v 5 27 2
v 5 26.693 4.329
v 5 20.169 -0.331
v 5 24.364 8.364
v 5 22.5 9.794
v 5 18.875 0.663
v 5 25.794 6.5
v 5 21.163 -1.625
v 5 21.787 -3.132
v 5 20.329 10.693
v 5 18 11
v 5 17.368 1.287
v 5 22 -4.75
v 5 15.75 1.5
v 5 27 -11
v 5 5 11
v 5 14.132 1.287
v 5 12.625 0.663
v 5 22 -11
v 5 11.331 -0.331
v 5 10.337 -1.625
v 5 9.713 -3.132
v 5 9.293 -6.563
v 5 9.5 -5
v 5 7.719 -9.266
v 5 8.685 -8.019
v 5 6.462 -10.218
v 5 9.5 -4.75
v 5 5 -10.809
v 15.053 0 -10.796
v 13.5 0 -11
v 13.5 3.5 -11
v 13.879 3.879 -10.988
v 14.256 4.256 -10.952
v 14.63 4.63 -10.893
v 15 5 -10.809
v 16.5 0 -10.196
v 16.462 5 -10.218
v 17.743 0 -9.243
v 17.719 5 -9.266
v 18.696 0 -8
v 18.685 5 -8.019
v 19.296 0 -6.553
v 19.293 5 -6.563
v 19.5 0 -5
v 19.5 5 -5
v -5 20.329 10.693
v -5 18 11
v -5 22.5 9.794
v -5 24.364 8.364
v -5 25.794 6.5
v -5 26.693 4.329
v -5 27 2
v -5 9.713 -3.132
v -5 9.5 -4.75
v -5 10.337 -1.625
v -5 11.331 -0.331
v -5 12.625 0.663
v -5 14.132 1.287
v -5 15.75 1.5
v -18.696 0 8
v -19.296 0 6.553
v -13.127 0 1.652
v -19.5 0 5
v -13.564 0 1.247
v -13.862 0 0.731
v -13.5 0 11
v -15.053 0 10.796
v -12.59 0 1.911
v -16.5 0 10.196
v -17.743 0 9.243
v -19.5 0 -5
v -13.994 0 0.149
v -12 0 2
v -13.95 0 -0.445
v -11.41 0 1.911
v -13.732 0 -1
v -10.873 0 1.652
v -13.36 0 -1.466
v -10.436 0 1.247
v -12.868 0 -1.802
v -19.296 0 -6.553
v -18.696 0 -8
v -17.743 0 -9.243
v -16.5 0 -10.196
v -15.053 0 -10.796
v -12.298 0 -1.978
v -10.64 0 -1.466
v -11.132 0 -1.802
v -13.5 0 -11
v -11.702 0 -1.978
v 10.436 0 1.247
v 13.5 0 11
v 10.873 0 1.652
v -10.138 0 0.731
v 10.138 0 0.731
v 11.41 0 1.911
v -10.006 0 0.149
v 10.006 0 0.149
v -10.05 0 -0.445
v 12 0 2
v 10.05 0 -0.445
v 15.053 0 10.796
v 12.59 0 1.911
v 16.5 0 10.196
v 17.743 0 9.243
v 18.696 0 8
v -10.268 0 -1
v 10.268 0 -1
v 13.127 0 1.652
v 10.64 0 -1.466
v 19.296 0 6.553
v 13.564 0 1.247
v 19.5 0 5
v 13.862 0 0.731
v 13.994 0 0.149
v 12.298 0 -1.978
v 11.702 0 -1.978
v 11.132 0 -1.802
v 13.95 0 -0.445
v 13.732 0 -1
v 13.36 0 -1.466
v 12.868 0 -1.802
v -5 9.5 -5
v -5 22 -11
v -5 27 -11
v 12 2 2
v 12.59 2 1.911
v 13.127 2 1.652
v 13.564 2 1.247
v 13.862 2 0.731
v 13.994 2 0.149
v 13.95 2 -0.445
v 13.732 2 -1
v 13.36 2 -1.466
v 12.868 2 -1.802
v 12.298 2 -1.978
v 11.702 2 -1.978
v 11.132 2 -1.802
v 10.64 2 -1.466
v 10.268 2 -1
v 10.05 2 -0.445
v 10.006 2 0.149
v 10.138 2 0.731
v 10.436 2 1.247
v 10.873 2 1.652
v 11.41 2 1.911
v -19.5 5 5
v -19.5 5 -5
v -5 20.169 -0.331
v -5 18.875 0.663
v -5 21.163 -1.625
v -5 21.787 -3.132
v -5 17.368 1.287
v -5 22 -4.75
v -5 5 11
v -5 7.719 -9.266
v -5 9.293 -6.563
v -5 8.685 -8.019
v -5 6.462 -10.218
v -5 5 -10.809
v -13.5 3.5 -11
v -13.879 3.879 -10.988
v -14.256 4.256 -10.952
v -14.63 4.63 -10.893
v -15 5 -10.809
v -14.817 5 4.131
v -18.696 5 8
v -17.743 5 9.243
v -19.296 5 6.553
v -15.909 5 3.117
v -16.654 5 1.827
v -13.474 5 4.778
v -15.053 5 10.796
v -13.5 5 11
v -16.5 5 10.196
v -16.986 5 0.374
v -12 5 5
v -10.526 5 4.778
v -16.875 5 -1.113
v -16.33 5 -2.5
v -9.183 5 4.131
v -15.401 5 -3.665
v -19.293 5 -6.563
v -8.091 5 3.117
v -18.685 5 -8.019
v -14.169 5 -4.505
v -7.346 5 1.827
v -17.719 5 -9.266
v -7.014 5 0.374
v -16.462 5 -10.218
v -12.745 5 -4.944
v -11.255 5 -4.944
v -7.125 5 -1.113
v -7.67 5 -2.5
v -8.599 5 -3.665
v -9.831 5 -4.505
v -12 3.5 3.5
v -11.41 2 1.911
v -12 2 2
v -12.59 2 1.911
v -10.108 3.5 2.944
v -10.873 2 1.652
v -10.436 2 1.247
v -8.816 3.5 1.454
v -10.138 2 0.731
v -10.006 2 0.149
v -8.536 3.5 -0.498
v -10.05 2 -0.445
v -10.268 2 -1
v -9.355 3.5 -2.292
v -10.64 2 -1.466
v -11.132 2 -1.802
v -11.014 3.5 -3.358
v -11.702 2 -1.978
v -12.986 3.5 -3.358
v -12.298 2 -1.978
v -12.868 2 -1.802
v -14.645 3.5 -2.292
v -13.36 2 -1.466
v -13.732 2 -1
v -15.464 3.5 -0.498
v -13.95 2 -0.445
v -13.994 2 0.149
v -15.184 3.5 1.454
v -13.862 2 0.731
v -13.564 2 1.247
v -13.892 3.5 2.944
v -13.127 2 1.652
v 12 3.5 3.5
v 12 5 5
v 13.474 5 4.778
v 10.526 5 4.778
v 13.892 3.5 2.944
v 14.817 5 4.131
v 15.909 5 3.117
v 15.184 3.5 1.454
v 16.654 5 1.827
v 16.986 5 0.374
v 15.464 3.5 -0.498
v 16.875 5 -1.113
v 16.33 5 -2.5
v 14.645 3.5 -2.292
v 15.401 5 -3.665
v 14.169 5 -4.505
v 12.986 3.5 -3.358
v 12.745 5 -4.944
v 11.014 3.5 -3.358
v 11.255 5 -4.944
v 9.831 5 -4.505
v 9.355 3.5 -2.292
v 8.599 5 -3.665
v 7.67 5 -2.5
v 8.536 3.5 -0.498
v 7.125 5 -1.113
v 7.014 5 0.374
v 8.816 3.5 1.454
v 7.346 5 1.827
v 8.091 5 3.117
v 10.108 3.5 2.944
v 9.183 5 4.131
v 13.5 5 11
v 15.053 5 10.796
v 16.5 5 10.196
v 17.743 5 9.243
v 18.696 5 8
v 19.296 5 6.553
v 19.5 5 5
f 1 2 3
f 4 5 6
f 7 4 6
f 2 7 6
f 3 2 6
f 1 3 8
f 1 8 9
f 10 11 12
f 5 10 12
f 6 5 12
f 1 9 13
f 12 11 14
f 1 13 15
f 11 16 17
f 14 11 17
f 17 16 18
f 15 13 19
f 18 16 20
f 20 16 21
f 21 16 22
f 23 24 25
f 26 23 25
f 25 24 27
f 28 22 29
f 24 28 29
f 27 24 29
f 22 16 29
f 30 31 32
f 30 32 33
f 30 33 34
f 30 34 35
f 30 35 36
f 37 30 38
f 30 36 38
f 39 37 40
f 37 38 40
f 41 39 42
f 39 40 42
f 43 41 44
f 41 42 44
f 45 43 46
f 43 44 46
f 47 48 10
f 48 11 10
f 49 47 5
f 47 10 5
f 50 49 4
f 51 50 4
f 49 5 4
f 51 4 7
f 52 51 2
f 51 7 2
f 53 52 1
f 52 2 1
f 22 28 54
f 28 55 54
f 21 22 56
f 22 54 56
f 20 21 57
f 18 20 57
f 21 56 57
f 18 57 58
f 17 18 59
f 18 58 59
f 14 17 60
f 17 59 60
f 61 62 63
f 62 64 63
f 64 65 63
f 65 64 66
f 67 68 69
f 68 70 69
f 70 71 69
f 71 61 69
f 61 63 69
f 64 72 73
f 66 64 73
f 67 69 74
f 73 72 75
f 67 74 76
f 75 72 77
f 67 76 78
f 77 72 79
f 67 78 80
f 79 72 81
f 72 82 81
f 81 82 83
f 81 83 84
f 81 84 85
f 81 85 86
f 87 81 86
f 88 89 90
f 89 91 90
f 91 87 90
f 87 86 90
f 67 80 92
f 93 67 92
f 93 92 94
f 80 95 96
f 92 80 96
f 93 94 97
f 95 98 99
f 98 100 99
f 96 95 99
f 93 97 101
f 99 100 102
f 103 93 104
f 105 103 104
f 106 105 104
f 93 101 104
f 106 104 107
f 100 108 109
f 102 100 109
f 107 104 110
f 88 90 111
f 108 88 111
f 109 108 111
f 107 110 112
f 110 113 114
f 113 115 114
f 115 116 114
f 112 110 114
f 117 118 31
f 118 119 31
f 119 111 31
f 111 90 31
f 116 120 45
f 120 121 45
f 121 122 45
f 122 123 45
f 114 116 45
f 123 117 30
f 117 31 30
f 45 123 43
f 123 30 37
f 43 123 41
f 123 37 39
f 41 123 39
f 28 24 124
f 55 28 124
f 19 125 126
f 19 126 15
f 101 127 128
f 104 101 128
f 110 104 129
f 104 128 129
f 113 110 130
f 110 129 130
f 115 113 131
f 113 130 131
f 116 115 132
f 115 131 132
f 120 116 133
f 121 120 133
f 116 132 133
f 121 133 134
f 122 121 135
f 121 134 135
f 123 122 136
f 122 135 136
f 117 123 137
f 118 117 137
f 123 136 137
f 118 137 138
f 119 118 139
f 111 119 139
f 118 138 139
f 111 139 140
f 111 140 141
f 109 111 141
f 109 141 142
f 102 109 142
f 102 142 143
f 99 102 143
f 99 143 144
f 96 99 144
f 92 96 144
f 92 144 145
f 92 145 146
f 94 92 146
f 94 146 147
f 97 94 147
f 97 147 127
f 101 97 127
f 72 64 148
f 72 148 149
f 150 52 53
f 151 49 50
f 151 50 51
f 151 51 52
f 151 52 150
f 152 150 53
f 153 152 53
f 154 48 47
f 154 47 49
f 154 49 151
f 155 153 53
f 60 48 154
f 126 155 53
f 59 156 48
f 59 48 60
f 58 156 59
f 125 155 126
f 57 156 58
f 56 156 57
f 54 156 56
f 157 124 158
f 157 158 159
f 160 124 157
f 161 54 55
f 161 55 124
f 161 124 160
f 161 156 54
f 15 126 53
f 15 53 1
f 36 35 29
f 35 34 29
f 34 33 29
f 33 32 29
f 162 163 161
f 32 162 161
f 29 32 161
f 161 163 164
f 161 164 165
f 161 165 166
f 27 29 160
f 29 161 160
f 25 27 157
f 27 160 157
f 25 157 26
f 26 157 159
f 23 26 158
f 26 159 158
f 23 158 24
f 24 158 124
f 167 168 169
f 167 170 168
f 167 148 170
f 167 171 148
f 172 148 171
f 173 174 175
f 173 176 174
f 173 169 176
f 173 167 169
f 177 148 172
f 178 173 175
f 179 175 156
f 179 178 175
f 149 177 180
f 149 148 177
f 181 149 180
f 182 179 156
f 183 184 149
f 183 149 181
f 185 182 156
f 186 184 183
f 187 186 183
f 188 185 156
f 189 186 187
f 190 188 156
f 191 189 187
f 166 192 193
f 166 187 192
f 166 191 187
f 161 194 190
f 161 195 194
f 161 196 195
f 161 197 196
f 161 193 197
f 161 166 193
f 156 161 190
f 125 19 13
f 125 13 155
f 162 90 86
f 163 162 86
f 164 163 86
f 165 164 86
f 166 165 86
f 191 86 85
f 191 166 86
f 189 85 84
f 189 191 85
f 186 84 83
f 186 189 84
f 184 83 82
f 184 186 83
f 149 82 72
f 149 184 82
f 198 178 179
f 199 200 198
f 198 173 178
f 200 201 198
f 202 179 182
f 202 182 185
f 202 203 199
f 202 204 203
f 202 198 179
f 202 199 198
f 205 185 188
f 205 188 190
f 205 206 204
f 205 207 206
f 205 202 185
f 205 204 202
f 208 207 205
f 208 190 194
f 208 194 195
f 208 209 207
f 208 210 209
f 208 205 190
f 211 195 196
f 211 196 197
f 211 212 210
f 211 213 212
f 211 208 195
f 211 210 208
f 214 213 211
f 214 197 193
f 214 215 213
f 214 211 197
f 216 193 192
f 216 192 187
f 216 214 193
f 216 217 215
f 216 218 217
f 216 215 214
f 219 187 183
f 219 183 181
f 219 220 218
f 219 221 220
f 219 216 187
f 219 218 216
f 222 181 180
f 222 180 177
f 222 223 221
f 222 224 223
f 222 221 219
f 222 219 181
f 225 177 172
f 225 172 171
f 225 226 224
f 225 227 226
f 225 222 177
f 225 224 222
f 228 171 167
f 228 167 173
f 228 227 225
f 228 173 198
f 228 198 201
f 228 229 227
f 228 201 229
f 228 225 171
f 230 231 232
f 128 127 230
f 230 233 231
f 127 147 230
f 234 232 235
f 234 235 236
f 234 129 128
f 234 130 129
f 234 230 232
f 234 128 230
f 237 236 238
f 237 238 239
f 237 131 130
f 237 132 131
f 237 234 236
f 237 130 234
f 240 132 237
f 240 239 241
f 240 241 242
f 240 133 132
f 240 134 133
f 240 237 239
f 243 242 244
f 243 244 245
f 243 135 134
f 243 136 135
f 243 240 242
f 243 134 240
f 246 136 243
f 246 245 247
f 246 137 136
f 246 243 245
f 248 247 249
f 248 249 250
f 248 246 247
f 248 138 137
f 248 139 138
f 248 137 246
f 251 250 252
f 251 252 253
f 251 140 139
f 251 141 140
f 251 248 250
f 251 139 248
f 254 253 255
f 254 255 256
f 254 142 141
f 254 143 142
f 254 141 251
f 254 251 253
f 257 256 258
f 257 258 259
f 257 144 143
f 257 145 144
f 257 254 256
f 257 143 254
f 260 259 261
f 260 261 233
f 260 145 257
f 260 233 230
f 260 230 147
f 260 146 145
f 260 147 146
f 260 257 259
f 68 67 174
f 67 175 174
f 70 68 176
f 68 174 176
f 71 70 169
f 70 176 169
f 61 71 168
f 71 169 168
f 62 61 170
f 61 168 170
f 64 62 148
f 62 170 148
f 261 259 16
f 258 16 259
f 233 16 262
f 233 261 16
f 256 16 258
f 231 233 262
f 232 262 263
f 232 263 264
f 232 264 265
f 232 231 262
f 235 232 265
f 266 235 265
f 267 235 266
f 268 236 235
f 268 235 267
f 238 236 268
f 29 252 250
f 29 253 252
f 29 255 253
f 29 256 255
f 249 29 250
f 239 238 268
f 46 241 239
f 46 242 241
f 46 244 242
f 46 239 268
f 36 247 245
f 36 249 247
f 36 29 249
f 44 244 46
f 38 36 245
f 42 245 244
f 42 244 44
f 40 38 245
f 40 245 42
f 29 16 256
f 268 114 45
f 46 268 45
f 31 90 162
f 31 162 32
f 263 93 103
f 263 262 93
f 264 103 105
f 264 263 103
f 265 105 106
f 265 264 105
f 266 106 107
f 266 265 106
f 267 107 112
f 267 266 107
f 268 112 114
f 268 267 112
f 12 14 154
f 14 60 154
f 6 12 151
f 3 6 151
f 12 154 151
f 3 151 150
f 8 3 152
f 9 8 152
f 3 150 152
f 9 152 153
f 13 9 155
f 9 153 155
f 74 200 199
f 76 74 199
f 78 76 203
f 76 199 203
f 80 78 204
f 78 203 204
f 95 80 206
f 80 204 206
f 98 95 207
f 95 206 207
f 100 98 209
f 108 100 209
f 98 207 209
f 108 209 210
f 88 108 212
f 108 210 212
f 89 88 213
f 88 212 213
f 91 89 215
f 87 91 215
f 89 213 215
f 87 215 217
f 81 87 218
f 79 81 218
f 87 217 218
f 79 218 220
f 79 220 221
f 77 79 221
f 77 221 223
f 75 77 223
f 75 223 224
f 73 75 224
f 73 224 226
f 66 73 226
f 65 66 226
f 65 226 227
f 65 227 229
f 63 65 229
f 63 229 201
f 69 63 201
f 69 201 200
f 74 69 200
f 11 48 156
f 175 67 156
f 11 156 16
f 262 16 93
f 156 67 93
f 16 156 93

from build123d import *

# Parameters (mm, degrees)
SKETCH1_W           = 39
SKETCH1_H           = 22
BOSS_EXTRUDE1_DEPTH = 5
SKETCH2_W           = 10
SKETCH2_H           = 22
BOSS_EXTRUDE2_DEPTH = 22
SKETCH3_W           = 10
SKETCH3_H           = 12.5
CUT_EXTRUDE1_DEPTH  = 12.5
FILLET1_R           = 6.25
FILLET2_R           = 6
FILLET3_R           = 9
SKETCH5_R           = 2
CUT_EXTRUDE3_DEPTH  = 32.388692231
FILLET4_R           = 6
CHAMFER4_SIZE       = 3


# Some blends are built 0.0001 mm under size
with BuildPart() as part:
    # Sketch1 → Boss-Extrude1 (new body)
    with BuildSketch(Plane(origin=(0, 0, 0), x_dir=(1, 0, 0), z_dir=(0, 1, 0))):
        Rectangle(SKETCH1_W, SKETCH1_H)
    extrude(amount=BOSS_EXTRUDE1_DEPTH)

    # Sketch2 → Boss-Extrude2 (add)
    with BuildSketch(Plane(origin=(0, 5, 0), x_dir=(1, 0, 0), z_dir=(0, 1, 0))):
        Rectangle(SKETCH2_W, SKETCH2_H)
    extrude(amount=BOSS_EXTRUDE2_DEPTH)

    # Sketch3 → Cut-Extrude1 (cut)
    with BuildSketch(Plane(origin=(0, 0, -11), x_dir=(-1, 0, 0), z_dir=(0, 0, -1))):
        with Locations((0, 15.75)):
            Rectangle(SKETCH3_W, SKETCH3_H)
    extrude(amount=-CUT_EXTRUDE1_DEPTH, mode=Mode.SUBTRACT)

    # Fillet1
    fillet1_edges = [part.edges().sort_by_distance(p)[0] for p in [
        (0, 22, 1.5),
        (0, 9.5, 1.5),
    ]]
    fillet(fillet1_edges, radius=FILLET1_R - 0.0001)  # a hair under: the kernel refuses the full size

    # Fillet2
    fillet2_edges = [part.edges().sort_by_distance(p)[0] for p in [
        (-19.5, 2.5, -11),
        (19.5, 2.5, -11),
        (19.5, 2.5, 11),
        (-19.5, 2.5, 11),
    ]]
    fillet(fillet2_edges, radius=FILLET2_R)

    # Fillet3
    fillet3_edges = [part.edges().sort_by_distance(p)[0] for p in [
        (0, 27, 11),
    ]]
    fillet(fillet3_edges, radius=FILLET3_R)

    # Sketch5 → Cut-Extrude3 (cut, through all)
    with BuildSketch(Plane(origin=(0, 5, 0), x_dir=(1, 0, 0), z_dir=(0, 1, 0))):
        with Locations(Location((-12, 0, 0), (0, 0, 270))):
            Circle(SKETCH5_R)
        with Locations(Location((12, 0, 0), (0, 0, 270))):
            Circle(SKETCH5_R)
    extrude(amount=-CUT_EXTRUDE3_DEPTH, mode=Mode.SUBTRACT)

    # Fillet4
    # the kernel refuses this fillet: 6 mm, written as the material it takes off along each edge
    with BuildSketch(Plane(origin=(-20, 9.5, -11), x_dir=(0, -1, 0), z_dir=(1, 0, 0))) as fillet4_piece_1:
        with BuildLine():
            CenterArc((FILLET4_R, -FILLET4_R), FILLET4_R, 90, 90)
            Line((0, -FILLET4_R), (0, 0))
            Line((0, 0), (FILLET4_R, 0))
        make_face()
    extrude(amount=40, mode=Mode.SUBTRACT)

    # Chamfer4
    chamfer4_edges = [part.edges().sort_by_distance(p)[0] for p in [
        (-12, 5, -2),
        (12, 5, -2),
    ]]
    chamfer(chamfer4_edges, length=CHAMFER4_SIZE)


solid = part.part
